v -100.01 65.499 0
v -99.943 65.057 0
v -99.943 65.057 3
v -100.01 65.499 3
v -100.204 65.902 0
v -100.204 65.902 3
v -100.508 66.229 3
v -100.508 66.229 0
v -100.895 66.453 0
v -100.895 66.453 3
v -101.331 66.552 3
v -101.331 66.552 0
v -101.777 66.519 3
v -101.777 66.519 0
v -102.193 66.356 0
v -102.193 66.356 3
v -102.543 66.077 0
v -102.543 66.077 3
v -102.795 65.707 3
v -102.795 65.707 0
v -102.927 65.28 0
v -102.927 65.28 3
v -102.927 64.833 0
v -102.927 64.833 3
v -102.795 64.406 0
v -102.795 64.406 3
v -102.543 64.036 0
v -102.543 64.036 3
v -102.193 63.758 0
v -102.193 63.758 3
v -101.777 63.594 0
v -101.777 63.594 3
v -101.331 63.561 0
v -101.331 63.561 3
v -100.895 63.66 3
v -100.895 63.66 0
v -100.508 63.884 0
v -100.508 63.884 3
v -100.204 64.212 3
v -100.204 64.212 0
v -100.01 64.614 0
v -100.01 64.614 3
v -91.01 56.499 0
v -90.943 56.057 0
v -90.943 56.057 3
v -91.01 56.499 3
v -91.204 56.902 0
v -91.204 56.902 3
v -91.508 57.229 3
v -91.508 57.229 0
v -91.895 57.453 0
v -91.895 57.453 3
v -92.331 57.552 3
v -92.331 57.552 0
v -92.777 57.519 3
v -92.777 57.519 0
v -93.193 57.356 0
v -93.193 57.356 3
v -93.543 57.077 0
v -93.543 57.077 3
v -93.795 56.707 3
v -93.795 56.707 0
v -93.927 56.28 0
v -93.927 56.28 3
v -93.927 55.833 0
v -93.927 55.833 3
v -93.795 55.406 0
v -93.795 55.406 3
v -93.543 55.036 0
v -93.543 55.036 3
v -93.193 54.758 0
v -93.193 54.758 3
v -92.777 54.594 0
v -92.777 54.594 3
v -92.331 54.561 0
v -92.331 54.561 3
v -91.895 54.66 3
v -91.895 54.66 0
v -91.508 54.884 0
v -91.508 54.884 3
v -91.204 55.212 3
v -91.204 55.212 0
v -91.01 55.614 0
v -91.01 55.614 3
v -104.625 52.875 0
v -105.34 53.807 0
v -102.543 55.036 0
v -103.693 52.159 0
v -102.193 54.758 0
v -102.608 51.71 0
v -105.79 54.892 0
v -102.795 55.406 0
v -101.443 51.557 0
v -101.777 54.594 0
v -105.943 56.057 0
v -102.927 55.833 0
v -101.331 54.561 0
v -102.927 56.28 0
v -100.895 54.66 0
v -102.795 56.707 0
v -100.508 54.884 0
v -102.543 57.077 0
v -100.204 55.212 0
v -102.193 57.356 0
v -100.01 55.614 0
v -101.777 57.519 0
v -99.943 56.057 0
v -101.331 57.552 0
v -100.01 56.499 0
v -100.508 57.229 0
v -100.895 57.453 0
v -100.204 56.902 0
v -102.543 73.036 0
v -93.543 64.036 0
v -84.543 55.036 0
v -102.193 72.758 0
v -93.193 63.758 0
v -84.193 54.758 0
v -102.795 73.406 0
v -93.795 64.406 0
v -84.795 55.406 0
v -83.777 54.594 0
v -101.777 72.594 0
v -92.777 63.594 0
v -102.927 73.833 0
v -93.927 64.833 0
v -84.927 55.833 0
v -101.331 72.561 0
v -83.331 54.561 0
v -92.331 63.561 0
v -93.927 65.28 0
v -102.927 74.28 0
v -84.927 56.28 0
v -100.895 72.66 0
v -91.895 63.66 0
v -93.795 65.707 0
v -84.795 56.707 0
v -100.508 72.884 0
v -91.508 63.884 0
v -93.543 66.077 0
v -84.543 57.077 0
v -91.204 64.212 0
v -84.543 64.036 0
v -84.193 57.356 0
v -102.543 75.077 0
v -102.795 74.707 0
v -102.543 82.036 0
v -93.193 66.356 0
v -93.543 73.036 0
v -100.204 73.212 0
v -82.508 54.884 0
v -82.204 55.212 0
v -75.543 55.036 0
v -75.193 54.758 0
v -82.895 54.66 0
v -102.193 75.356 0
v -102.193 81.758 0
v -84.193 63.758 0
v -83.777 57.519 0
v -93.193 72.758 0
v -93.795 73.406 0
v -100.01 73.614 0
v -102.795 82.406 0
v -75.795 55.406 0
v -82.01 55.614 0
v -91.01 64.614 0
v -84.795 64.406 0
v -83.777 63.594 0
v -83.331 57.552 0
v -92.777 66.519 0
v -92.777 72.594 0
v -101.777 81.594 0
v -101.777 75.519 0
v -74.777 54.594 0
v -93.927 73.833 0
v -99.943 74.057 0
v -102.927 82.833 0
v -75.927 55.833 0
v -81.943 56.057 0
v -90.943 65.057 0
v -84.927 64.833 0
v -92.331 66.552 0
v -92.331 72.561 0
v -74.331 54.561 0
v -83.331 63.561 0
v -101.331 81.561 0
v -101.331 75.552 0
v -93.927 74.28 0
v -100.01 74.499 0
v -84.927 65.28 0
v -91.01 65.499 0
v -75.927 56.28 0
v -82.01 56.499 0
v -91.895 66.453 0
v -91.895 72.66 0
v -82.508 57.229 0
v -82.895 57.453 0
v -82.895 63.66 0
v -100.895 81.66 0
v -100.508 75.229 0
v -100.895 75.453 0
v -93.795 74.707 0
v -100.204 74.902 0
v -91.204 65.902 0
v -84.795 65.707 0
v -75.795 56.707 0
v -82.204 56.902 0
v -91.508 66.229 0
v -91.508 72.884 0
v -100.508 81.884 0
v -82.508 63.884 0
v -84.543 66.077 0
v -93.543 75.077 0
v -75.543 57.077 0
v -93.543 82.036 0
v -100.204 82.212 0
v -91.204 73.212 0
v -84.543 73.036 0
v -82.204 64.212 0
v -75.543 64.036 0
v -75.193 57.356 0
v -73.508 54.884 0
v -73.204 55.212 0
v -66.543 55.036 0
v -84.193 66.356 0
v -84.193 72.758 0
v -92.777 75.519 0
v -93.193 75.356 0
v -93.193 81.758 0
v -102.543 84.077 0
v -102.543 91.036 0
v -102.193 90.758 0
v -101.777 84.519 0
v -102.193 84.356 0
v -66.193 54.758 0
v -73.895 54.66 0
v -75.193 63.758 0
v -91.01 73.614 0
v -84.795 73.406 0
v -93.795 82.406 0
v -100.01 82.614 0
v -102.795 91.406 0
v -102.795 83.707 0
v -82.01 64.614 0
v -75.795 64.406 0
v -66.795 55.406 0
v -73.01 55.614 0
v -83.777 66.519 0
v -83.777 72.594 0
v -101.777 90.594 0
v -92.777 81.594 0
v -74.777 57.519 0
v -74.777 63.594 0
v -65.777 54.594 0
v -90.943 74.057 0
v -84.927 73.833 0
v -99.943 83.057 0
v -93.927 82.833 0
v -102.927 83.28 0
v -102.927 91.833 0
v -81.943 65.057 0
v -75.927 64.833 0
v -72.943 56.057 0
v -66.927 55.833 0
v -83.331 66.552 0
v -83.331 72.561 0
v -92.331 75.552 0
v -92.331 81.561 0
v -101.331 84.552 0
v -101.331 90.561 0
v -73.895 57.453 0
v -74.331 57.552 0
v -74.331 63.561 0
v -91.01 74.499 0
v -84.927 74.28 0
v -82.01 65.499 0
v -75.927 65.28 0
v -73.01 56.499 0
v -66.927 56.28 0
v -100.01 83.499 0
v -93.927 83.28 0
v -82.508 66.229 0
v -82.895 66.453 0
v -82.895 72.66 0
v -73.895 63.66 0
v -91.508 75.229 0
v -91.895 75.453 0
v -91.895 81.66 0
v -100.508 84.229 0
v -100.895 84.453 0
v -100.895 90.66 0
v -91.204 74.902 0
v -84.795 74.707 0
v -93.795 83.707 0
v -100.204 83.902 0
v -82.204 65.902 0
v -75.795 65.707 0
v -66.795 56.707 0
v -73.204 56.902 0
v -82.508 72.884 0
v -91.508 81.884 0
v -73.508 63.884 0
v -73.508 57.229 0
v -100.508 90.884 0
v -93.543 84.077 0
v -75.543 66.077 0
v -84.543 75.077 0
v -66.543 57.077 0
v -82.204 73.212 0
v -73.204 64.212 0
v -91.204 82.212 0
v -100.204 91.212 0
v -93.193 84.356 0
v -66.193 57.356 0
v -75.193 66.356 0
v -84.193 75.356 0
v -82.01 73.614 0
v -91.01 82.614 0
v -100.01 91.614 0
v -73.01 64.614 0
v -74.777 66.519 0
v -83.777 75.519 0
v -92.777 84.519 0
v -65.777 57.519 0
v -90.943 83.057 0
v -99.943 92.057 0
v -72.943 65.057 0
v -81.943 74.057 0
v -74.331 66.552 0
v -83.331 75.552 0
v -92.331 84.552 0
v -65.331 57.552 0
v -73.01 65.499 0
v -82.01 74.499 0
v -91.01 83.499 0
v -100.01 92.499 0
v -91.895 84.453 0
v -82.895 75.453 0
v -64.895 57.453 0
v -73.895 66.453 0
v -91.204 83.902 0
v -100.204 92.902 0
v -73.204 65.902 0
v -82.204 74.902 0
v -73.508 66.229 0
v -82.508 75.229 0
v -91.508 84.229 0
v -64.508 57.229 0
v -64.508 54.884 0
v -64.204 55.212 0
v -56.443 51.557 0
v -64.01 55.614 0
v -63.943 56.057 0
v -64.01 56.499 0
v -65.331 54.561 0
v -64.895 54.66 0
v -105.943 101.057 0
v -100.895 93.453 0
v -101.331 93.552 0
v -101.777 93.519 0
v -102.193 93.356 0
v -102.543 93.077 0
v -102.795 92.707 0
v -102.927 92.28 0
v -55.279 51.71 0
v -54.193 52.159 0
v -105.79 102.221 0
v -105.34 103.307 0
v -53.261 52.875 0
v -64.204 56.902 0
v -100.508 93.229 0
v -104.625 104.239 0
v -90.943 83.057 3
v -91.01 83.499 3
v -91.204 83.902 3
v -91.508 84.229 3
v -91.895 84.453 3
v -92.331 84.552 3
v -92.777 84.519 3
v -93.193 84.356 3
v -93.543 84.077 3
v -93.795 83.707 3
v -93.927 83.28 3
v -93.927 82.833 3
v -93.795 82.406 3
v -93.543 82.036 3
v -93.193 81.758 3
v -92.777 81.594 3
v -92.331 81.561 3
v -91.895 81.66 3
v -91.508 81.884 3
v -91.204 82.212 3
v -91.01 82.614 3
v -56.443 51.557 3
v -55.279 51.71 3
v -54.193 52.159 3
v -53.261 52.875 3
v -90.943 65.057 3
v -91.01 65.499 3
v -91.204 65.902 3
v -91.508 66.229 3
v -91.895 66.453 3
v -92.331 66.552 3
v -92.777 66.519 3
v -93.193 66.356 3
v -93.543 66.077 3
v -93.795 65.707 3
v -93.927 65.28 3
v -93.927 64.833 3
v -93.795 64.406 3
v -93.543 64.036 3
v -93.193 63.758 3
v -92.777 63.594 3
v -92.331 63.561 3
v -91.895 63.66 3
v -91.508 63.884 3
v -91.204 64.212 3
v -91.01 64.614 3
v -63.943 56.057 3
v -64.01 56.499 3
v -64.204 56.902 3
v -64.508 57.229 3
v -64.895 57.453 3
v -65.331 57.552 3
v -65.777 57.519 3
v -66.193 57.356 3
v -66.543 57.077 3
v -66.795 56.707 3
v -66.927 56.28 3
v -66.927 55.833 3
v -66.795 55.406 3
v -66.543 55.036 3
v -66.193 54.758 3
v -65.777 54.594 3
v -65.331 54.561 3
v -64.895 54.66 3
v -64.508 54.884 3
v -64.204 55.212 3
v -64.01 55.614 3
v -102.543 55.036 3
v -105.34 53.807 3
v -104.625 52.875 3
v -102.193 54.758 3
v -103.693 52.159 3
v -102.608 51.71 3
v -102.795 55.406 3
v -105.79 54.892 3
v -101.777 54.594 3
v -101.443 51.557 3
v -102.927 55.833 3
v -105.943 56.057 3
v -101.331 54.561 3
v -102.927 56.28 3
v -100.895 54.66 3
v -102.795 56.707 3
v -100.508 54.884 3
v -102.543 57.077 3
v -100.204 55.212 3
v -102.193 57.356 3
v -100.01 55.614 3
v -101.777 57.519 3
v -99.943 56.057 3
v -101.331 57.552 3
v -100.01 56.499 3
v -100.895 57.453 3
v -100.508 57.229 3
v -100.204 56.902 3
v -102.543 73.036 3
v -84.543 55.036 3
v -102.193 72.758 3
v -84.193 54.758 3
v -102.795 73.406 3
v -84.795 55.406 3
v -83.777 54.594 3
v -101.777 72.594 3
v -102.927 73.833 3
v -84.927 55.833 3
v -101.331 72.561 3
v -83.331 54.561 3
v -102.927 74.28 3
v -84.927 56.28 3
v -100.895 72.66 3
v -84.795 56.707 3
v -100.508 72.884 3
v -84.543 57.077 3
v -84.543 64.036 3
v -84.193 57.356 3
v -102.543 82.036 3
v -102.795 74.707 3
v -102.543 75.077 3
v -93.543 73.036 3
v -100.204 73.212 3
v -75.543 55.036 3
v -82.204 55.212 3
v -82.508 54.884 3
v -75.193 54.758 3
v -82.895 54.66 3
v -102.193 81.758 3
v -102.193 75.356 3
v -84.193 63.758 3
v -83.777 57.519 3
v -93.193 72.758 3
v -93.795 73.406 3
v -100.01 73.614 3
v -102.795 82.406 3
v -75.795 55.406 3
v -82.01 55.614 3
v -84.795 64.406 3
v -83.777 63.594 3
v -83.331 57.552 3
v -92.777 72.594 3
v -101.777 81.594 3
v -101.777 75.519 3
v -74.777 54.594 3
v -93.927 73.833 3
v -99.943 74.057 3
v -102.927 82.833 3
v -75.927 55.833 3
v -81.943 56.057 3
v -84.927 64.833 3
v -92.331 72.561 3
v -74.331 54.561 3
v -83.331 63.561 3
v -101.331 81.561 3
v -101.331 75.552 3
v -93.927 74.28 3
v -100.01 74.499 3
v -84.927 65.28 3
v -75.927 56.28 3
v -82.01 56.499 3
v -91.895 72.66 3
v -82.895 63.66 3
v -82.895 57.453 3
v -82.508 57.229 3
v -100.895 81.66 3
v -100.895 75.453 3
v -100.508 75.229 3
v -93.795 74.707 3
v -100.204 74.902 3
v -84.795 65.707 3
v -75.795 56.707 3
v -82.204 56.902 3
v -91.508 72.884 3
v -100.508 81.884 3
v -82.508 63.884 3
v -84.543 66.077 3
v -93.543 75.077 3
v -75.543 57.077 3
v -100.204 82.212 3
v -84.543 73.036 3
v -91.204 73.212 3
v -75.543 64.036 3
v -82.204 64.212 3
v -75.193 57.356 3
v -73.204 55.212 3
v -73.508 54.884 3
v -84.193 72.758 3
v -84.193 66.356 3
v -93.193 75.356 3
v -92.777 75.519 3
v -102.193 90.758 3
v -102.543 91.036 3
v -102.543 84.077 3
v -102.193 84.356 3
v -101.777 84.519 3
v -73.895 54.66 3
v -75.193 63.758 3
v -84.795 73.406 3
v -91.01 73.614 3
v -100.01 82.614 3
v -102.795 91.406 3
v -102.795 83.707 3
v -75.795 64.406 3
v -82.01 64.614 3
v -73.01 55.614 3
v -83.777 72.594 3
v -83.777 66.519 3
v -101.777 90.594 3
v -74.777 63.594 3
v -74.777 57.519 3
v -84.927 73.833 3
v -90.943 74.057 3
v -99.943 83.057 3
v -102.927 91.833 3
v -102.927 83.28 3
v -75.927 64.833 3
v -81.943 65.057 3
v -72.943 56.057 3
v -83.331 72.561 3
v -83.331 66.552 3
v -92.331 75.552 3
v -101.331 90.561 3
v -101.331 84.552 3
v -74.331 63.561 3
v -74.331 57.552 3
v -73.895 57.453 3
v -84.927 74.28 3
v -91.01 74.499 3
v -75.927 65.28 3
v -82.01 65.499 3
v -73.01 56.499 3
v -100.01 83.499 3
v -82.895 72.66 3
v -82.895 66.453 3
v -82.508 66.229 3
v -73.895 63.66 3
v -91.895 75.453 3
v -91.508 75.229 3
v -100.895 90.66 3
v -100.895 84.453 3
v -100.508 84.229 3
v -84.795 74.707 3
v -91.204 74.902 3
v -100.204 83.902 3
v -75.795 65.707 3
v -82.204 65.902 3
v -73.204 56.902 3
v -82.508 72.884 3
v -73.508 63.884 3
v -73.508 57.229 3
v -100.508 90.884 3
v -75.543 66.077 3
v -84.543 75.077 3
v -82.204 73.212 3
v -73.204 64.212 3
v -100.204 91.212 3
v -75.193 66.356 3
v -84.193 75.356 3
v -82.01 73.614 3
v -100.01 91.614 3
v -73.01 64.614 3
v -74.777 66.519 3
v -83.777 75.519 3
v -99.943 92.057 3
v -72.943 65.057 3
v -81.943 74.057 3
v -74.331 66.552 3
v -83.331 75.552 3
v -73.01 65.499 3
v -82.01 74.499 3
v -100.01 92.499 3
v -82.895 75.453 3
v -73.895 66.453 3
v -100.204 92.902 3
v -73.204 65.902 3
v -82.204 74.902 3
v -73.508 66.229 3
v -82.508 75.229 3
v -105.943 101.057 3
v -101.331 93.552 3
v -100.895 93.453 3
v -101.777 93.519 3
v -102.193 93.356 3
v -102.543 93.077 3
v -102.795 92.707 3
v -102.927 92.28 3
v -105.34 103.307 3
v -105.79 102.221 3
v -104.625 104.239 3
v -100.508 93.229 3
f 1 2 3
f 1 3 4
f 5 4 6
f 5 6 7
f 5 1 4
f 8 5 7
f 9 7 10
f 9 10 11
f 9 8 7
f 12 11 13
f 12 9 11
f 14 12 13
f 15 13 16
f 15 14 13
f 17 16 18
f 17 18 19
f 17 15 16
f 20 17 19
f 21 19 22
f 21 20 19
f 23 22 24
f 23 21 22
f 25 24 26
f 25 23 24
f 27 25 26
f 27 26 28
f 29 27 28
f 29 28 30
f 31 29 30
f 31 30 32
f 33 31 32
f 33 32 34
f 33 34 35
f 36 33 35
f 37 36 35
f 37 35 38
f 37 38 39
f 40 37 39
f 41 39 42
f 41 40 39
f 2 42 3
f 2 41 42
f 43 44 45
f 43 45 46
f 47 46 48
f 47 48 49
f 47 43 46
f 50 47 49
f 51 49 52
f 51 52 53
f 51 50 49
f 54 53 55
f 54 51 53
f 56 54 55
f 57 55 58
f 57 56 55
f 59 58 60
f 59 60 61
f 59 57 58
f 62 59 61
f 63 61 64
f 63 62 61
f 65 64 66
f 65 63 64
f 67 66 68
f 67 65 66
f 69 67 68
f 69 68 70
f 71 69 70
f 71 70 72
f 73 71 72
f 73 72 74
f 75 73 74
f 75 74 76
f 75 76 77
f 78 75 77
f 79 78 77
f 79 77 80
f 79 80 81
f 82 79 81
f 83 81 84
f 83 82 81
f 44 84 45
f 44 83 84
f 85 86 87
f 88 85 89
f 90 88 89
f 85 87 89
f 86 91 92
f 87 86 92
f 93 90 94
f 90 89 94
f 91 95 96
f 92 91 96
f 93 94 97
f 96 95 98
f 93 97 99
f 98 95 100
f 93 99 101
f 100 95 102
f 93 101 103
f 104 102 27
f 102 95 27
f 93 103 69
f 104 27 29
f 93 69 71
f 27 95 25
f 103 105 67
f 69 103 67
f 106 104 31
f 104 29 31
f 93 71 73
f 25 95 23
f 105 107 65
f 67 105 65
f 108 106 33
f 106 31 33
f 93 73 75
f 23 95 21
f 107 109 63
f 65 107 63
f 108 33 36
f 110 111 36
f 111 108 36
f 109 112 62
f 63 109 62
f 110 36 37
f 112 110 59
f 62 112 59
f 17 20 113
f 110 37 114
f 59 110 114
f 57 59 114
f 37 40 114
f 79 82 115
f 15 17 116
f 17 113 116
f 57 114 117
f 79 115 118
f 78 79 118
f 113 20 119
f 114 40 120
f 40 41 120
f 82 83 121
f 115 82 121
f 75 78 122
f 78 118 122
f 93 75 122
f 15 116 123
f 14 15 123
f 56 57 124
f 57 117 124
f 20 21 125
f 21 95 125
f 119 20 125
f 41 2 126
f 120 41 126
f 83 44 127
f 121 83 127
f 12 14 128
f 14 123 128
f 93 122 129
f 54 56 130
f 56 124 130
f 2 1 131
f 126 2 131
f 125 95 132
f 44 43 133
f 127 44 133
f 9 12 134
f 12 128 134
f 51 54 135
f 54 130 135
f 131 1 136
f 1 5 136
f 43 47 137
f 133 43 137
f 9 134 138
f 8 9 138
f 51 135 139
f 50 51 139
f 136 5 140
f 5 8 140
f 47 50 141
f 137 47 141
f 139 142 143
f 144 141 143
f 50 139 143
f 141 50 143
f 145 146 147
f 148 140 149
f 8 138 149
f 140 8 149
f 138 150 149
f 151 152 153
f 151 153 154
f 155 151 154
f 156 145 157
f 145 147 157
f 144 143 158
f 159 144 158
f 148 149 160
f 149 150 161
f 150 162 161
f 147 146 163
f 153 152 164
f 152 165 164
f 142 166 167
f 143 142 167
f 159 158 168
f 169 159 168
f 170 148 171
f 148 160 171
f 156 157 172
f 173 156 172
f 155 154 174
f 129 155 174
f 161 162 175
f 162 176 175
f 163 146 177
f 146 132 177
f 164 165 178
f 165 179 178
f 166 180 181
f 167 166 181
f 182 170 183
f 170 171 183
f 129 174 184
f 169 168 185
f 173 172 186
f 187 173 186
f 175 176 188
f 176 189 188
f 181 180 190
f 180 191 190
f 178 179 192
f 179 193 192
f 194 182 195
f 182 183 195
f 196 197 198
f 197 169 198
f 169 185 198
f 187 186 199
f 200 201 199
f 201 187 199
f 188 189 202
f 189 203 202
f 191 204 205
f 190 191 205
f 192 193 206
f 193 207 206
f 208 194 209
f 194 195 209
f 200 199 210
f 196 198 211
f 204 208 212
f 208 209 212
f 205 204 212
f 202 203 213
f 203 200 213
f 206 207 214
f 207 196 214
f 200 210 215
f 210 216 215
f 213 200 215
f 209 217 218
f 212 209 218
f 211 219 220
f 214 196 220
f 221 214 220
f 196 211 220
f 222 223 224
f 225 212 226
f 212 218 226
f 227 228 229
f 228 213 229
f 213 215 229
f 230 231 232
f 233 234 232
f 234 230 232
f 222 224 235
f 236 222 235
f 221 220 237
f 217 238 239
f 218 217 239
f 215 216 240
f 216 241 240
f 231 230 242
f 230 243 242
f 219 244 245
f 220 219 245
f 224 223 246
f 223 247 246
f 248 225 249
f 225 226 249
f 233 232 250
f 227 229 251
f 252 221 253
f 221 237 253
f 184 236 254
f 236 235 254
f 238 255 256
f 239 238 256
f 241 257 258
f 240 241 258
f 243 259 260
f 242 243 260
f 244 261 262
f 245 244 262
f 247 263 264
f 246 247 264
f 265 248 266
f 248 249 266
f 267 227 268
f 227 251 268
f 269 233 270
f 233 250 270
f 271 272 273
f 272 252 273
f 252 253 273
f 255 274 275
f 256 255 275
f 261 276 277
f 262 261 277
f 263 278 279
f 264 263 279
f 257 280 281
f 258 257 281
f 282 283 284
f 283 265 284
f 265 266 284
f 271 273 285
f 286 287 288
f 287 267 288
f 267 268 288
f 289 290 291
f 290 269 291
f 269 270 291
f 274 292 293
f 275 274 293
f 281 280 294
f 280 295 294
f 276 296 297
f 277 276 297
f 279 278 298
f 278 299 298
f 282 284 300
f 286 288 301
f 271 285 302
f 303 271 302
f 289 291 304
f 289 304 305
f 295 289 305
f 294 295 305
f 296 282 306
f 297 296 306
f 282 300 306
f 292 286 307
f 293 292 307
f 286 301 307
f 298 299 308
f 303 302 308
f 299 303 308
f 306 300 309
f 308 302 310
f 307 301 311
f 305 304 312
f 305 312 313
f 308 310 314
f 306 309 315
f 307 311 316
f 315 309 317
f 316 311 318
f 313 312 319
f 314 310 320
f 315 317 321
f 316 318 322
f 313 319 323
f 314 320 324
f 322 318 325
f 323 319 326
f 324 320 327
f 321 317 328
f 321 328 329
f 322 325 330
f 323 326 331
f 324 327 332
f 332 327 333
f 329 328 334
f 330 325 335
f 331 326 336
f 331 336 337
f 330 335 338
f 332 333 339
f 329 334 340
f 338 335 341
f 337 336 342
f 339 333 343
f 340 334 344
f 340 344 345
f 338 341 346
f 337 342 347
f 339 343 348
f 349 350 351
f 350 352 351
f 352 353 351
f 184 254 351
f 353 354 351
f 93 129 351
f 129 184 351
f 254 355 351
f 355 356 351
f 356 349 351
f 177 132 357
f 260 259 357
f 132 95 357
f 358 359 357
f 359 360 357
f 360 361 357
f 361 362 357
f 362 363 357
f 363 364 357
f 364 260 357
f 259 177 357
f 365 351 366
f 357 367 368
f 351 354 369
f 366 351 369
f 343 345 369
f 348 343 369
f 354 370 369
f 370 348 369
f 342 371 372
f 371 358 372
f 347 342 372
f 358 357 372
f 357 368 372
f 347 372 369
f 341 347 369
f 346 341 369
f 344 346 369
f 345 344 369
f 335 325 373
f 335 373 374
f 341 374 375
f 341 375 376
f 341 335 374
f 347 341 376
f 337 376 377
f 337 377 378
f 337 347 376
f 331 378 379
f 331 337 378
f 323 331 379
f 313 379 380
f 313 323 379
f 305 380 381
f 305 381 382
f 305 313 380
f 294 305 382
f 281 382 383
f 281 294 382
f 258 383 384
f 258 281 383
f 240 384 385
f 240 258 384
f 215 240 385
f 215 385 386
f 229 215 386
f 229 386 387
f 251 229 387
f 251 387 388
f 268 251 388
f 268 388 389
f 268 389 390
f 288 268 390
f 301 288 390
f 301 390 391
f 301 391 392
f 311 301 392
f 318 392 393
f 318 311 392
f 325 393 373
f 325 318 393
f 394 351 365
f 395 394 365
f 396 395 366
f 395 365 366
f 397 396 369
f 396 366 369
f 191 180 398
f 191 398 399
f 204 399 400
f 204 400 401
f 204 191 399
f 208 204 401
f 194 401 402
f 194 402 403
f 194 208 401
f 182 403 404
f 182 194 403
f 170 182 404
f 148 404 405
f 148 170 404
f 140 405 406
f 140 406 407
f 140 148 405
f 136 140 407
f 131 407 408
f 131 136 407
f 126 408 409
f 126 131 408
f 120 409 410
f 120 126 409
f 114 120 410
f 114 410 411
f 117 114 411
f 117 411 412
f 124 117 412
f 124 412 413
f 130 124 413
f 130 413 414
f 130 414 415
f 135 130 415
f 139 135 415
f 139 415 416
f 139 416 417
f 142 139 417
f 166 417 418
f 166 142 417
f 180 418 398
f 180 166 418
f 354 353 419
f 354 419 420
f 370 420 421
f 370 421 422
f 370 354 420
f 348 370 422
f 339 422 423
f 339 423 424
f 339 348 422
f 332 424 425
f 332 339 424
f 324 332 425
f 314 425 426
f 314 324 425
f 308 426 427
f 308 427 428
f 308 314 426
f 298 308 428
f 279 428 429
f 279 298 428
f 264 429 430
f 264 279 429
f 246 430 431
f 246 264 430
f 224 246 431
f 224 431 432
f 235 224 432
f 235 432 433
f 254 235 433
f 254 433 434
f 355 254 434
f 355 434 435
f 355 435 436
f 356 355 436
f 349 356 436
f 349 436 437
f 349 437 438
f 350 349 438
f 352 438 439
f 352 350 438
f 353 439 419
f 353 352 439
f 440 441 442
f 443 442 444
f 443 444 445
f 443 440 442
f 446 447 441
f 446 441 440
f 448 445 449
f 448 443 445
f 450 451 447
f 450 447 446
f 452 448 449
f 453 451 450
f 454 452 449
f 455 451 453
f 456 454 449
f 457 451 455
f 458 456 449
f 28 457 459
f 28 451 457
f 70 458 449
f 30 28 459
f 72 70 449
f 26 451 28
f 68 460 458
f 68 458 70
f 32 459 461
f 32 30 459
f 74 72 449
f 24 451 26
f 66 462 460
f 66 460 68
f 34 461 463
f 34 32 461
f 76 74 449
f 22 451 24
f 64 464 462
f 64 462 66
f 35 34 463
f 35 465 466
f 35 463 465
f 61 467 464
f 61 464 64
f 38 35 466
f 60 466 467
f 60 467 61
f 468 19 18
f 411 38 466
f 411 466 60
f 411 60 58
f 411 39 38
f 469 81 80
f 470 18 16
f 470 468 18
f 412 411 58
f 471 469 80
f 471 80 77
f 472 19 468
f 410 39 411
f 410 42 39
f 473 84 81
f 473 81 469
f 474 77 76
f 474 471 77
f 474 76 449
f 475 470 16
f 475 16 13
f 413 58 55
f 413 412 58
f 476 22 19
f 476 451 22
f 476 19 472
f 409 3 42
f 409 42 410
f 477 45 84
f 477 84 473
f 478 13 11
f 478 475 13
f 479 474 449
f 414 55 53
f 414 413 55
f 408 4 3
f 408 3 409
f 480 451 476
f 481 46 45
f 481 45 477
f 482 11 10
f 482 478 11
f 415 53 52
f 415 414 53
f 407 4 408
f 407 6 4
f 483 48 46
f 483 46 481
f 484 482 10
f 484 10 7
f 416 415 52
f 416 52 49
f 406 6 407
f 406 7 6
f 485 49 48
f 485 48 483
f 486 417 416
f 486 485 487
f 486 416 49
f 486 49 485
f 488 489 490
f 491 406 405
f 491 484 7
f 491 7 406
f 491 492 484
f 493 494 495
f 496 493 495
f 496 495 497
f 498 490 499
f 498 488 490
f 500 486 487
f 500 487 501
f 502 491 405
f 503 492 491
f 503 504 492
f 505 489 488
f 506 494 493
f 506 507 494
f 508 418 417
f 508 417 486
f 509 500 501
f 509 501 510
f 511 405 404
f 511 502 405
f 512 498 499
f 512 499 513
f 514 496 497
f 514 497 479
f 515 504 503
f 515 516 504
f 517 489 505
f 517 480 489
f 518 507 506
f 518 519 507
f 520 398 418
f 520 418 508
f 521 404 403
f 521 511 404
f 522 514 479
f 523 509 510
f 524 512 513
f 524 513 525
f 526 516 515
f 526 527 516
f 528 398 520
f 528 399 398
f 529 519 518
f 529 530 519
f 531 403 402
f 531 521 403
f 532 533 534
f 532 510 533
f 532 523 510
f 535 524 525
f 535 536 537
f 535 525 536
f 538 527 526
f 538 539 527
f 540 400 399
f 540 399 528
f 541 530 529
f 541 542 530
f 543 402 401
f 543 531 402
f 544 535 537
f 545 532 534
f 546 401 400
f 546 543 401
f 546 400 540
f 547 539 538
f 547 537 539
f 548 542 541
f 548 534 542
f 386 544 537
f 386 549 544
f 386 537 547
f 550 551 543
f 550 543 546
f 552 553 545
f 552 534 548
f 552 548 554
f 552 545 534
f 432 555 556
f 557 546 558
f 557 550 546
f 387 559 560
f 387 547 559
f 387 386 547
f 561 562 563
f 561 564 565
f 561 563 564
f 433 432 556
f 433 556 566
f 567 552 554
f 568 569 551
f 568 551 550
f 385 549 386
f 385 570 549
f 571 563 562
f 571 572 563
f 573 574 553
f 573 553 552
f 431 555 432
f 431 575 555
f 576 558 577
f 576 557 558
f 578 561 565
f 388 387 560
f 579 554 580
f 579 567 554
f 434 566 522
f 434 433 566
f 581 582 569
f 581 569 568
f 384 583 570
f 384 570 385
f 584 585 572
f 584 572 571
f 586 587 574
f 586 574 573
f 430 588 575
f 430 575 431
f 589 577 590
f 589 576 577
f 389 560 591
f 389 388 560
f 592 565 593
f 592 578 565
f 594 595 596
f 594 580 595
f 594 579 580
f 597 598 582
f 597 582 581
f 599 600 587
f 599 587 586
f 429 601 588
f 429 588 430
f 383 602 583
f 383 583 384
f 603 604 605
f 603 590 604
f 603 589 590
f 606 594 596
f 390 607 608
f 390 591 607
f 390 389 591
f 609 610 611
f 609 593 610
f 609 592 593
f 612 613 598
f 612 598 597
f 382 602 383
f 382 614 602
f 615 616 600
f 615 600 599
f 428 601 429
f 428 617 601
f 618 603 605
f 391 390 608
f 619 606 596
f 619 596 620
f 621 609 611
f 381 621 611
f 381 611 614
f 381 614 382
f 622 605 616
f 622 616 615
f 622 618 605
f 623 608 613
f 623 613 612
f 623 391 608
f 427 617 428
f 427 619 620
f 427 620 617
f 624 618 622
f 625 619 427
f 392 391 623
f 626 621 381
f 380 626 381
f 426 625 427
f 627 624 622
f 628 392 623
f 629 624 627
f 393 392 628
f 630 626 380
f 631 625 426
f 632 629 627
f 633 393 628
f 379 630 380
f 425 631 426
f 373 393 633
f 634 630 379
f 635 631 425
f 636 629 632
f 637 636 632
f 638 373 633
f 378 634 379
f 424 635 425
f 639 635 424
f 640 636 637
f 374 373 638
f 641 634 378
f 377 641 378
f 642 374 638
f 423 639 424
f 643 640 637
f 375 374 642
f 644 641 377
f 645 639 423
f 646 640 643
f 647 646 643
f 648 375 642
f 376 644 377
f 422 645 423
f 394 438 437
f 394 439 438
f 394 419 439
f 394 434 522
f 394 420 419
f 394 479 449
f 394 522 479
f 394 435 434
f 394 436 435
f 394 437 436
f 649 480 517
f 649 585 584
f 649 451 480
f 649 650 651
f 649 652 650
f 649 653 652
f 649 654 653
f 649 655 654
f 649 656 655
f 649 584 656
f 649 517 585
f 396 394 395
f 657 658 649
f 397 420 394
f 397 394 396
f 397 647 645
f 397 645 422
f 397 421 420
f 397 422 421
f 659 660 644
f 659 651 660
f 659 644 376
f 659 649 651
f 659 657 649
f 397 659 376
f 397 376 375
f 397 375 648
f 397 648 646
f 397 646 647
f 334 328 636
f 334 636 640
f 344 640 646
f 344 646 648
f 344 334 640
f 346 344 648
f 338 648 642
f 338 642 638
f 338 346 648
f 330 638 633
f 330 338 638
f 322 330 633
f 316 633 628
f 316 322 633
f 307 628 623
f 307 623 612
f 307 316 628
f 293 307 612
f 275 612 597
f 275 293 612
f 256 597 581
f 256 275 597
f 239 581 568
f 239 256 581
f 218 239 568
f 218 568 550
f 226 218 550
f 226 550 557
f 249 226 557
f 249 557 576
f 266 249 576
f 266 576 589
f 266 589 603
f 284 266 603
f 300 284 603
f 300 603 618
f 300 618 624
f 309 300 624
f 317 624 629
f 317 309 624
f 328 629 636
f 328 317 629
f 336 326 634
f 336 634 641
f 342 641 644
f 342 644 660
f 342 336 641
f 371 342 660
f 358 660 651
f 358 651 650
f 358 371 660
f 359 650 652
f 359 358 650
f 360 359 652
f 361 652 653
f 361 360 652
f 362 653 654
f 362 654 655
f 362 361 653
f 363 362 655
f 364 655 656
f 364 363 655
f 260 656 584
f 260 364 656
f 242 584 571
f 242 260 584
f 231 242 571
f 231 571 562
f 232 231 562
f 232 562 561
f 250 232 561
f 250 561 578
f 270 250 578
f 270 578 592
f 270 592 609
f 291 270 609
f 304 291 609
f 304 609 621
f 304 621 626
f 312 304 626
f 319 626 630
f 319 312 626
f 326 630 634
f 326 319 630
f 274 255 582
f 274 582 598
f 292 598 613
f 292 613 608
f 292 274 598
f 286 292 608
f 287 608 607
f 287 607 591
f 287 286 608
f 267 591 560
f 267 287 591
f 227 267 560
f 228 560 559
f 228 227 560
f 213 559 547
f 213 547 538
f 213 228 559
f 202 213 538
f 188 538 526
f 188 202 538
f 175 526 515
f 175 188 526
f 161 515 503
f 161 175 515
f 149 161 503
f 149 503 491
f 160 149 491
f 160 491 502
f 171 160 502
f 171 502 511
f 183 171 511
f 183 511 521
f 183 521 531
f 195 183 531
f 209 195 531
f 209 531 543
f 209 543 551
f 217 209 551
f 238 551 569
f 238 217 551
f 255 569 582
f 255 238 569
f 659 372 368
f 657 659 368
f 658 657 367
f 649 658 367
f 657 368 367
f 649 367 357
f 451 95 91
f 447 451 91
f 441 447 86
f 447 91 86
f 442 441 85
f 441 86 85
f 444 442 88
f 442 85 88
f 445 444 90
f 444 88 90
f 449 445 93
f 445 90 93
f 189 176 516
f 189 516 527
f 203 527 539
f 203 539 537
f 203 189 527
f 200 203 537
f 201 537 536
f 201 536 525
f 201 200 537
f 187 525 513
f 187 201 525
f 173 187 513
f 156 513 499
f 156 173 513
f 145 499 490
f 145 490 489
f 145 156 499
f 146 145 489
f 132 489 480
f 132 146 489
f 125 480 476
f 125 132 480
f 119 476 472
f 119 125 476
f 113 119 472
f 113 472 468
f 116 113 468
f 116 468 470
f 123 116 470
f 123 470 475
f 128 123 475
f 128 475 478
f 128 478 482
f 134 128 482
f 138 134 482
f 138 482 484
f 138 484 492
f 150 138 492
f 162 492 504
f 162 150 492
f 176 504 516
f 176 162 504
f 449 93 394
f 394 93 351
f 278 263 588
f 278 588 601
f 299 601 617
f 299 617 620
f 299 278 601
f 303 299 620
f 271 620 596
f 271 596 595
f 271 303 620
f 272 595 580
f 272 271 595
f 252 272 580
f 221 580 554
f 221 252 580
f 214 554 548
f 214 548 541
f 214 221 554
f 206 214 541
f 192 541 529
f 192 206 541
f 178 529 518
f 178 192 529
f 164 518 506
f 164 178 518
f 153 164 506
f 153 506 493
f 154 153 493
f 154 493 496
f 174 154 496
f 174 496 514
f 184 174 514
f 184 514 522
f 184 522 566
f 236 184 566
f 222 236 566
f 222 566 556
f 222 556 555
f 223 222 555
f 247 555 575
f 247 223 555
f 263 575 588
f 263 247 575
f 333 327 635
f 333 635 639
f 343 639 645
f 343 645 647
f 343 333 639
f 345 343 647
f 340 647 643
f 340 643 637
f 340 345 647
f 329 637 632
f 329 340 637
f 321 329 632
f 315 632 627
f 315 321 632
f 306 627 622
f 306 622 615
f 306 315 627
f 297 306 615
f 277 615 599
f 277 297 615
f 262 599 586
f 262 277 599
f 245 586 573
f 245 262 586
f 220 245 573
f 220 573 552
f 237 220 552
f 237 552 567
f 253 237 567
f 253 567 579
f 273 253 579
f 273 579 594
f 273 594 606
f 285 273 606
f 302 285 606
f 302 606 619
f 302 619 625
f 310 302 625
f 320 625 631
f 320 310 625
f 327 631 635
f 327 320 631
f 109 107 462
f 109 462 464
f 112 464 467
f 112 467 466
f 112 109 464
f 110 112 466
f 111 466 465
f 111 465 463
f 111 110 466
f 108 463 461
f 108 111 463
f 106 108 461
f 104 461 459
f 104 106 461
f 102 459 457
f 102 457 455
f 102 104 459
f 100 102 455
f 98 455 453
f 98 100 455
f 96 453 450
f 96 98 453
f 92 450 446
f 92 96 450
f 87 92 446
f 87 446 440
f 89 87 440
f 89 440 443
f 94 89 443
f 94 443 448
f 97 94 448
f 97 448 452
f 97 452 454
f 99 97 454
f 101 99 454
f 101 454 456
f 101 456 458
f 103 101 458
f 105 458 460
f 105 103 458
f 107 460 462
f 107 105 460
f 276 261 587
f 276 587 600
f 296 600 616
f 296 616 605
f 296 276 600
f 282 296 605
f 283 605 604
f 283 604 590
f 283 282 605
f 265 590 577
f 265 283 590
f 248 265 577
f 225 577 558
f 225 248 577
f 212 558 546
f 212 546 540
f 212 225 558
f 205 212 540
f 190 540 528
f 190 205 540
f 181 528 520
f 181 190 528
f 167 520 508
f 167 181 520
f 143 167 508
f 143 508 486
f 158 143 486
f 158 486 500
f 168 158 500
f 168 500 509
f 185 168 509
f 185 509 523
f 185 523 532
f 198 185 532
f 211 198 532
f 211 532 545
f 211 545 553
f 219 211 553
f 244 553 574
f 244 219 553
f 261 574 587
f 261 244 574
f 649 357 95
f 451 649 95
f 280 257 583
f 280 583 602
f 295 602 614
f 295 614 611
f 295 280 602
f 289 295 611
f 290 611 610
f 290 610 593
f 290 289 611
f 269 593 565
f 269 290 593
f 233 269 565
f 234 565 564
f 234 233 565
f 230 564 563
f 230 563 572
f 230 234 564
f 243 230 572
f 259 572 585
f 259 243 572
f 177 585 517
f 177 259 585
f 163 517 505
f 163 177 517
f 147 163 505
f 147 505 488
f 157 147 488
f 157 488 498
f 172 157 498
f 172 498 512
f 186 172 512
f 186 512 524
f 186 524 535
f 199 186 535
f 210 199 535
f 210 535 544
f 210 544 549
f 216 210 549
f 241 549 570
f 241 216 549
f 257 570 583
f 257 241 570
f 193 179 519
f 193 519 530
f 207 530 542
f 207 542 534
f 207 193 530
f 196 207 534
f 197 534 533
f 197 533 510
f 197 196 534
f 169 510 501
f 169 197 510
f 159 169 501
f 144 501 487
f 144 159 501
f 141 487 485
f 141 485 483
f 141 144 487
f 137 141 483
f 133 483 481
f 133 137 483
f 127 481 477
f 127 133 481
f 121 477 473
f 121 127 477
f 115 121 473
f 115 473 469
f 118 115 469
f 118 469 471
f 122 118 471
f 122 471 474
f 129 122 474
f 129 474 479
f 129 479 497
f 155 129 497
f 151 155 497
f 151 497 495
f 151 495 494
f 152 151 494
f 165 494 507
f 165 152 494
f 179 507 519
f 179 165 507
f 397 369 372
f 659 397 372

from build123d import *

# Parameters (mm, degrees)
MODEL_R                 = 1.5
SALIENTE_EXTRUIR1_DEPTH = 3


with BuildPart() as part:
    # Model → Saliente-Extruir1 (new body)
    with BuildSketch(Plane.XY):
        with BuildLine():
            Line((-105.943383637, 101.056539338), (-105.943383637, 56.056539338))
            ThreePointArc((-105.943383637, 56.056539338), (-104.625364152, 52.874558823), (-101.443383637, 51.556539338))
            Line((-101.443383637, 51.556539338), (-56.443383637, 51.556539338))
            ThreePointArc((-56.443383637, 51.556539338), (-54.721308191, 51.899081442), (-53.261403122, 52.874558823))
            Line((-53.261403122, 52.874558823), (-104.625364152, 104.238519853))
            ThreePointArc((-104.625364152, 104.238519853), (-105.600841533, 102.778614784), (-105.943383637, 101.056539338))
        make_face()
        with Locations((-101.443383637, 92.056539338)):
            Circle(MODEL_R, mode=Mode.SUBTRACT)
        with Locations((-101.443383637, 83.056539338)):
            Circle(MODEL_R, mode=Mode.SUBTRACT)
        with Locations((-92.443383637, 83.056539338)):
            Circle(MODEL_R, mode=Mode.SUBTRACT)
        with Locations((-101.443383637, 74.056539338)):
            Circle(MODEL_R, mode=Mode.SUBTRACT)
        with Locations((-92.443383637, 74.056539338)):
            Circle(MODEL_R, mode=Mode.SUBTRACT)
        with Locations((-83.443383637, 74.056539338)):
            Circle(MODEL_R, mode=Mode.SUBTRACT)
        with Locations((-101.443383637, 65.056539338)):
            Circle(MODEL_R, mode=Mode.SUBTRACT)
        with Locations((-92.443383637, 65.056539338)):
            Circle(MODEL_R, mode=Mode.SUBTRACT)
        with Locations((-83.443383637, 65.056539338)):
            Circle(MODEL_R, mode=Mode.SUBTRACT)
        with Locations((-74.443383637, 65.056539338)):
            Circle(MODEL_R, mode=Mode.SUBTRACT)
        with Locations((-101.443383637, 56.056539338)):
            Circle(MODEL_R, mode=Mode.SUBTRACT)
        with Locations((-92.443383637, 56.056539338)):
            Circle(MODEL_R, mode=Mode.SUBTRACT)
        with Locations((-83.443383637, 56.056539338)):
            Circle(MODEL_R, mode=Mode.SUBTRACT)
        with Locations((-74.443383637, 56.056539338)):
            Circle(MODEL_R, mode=Mode.SUBTRACT)
        with Locations((-65.443383637, 56.056539338)):
            Circle(MODEL_R, mode=Mode.SUBTRACT)
    extrude(amount=SALIENTE_EXTRUIR1_DEPTH)


solid = part.part
